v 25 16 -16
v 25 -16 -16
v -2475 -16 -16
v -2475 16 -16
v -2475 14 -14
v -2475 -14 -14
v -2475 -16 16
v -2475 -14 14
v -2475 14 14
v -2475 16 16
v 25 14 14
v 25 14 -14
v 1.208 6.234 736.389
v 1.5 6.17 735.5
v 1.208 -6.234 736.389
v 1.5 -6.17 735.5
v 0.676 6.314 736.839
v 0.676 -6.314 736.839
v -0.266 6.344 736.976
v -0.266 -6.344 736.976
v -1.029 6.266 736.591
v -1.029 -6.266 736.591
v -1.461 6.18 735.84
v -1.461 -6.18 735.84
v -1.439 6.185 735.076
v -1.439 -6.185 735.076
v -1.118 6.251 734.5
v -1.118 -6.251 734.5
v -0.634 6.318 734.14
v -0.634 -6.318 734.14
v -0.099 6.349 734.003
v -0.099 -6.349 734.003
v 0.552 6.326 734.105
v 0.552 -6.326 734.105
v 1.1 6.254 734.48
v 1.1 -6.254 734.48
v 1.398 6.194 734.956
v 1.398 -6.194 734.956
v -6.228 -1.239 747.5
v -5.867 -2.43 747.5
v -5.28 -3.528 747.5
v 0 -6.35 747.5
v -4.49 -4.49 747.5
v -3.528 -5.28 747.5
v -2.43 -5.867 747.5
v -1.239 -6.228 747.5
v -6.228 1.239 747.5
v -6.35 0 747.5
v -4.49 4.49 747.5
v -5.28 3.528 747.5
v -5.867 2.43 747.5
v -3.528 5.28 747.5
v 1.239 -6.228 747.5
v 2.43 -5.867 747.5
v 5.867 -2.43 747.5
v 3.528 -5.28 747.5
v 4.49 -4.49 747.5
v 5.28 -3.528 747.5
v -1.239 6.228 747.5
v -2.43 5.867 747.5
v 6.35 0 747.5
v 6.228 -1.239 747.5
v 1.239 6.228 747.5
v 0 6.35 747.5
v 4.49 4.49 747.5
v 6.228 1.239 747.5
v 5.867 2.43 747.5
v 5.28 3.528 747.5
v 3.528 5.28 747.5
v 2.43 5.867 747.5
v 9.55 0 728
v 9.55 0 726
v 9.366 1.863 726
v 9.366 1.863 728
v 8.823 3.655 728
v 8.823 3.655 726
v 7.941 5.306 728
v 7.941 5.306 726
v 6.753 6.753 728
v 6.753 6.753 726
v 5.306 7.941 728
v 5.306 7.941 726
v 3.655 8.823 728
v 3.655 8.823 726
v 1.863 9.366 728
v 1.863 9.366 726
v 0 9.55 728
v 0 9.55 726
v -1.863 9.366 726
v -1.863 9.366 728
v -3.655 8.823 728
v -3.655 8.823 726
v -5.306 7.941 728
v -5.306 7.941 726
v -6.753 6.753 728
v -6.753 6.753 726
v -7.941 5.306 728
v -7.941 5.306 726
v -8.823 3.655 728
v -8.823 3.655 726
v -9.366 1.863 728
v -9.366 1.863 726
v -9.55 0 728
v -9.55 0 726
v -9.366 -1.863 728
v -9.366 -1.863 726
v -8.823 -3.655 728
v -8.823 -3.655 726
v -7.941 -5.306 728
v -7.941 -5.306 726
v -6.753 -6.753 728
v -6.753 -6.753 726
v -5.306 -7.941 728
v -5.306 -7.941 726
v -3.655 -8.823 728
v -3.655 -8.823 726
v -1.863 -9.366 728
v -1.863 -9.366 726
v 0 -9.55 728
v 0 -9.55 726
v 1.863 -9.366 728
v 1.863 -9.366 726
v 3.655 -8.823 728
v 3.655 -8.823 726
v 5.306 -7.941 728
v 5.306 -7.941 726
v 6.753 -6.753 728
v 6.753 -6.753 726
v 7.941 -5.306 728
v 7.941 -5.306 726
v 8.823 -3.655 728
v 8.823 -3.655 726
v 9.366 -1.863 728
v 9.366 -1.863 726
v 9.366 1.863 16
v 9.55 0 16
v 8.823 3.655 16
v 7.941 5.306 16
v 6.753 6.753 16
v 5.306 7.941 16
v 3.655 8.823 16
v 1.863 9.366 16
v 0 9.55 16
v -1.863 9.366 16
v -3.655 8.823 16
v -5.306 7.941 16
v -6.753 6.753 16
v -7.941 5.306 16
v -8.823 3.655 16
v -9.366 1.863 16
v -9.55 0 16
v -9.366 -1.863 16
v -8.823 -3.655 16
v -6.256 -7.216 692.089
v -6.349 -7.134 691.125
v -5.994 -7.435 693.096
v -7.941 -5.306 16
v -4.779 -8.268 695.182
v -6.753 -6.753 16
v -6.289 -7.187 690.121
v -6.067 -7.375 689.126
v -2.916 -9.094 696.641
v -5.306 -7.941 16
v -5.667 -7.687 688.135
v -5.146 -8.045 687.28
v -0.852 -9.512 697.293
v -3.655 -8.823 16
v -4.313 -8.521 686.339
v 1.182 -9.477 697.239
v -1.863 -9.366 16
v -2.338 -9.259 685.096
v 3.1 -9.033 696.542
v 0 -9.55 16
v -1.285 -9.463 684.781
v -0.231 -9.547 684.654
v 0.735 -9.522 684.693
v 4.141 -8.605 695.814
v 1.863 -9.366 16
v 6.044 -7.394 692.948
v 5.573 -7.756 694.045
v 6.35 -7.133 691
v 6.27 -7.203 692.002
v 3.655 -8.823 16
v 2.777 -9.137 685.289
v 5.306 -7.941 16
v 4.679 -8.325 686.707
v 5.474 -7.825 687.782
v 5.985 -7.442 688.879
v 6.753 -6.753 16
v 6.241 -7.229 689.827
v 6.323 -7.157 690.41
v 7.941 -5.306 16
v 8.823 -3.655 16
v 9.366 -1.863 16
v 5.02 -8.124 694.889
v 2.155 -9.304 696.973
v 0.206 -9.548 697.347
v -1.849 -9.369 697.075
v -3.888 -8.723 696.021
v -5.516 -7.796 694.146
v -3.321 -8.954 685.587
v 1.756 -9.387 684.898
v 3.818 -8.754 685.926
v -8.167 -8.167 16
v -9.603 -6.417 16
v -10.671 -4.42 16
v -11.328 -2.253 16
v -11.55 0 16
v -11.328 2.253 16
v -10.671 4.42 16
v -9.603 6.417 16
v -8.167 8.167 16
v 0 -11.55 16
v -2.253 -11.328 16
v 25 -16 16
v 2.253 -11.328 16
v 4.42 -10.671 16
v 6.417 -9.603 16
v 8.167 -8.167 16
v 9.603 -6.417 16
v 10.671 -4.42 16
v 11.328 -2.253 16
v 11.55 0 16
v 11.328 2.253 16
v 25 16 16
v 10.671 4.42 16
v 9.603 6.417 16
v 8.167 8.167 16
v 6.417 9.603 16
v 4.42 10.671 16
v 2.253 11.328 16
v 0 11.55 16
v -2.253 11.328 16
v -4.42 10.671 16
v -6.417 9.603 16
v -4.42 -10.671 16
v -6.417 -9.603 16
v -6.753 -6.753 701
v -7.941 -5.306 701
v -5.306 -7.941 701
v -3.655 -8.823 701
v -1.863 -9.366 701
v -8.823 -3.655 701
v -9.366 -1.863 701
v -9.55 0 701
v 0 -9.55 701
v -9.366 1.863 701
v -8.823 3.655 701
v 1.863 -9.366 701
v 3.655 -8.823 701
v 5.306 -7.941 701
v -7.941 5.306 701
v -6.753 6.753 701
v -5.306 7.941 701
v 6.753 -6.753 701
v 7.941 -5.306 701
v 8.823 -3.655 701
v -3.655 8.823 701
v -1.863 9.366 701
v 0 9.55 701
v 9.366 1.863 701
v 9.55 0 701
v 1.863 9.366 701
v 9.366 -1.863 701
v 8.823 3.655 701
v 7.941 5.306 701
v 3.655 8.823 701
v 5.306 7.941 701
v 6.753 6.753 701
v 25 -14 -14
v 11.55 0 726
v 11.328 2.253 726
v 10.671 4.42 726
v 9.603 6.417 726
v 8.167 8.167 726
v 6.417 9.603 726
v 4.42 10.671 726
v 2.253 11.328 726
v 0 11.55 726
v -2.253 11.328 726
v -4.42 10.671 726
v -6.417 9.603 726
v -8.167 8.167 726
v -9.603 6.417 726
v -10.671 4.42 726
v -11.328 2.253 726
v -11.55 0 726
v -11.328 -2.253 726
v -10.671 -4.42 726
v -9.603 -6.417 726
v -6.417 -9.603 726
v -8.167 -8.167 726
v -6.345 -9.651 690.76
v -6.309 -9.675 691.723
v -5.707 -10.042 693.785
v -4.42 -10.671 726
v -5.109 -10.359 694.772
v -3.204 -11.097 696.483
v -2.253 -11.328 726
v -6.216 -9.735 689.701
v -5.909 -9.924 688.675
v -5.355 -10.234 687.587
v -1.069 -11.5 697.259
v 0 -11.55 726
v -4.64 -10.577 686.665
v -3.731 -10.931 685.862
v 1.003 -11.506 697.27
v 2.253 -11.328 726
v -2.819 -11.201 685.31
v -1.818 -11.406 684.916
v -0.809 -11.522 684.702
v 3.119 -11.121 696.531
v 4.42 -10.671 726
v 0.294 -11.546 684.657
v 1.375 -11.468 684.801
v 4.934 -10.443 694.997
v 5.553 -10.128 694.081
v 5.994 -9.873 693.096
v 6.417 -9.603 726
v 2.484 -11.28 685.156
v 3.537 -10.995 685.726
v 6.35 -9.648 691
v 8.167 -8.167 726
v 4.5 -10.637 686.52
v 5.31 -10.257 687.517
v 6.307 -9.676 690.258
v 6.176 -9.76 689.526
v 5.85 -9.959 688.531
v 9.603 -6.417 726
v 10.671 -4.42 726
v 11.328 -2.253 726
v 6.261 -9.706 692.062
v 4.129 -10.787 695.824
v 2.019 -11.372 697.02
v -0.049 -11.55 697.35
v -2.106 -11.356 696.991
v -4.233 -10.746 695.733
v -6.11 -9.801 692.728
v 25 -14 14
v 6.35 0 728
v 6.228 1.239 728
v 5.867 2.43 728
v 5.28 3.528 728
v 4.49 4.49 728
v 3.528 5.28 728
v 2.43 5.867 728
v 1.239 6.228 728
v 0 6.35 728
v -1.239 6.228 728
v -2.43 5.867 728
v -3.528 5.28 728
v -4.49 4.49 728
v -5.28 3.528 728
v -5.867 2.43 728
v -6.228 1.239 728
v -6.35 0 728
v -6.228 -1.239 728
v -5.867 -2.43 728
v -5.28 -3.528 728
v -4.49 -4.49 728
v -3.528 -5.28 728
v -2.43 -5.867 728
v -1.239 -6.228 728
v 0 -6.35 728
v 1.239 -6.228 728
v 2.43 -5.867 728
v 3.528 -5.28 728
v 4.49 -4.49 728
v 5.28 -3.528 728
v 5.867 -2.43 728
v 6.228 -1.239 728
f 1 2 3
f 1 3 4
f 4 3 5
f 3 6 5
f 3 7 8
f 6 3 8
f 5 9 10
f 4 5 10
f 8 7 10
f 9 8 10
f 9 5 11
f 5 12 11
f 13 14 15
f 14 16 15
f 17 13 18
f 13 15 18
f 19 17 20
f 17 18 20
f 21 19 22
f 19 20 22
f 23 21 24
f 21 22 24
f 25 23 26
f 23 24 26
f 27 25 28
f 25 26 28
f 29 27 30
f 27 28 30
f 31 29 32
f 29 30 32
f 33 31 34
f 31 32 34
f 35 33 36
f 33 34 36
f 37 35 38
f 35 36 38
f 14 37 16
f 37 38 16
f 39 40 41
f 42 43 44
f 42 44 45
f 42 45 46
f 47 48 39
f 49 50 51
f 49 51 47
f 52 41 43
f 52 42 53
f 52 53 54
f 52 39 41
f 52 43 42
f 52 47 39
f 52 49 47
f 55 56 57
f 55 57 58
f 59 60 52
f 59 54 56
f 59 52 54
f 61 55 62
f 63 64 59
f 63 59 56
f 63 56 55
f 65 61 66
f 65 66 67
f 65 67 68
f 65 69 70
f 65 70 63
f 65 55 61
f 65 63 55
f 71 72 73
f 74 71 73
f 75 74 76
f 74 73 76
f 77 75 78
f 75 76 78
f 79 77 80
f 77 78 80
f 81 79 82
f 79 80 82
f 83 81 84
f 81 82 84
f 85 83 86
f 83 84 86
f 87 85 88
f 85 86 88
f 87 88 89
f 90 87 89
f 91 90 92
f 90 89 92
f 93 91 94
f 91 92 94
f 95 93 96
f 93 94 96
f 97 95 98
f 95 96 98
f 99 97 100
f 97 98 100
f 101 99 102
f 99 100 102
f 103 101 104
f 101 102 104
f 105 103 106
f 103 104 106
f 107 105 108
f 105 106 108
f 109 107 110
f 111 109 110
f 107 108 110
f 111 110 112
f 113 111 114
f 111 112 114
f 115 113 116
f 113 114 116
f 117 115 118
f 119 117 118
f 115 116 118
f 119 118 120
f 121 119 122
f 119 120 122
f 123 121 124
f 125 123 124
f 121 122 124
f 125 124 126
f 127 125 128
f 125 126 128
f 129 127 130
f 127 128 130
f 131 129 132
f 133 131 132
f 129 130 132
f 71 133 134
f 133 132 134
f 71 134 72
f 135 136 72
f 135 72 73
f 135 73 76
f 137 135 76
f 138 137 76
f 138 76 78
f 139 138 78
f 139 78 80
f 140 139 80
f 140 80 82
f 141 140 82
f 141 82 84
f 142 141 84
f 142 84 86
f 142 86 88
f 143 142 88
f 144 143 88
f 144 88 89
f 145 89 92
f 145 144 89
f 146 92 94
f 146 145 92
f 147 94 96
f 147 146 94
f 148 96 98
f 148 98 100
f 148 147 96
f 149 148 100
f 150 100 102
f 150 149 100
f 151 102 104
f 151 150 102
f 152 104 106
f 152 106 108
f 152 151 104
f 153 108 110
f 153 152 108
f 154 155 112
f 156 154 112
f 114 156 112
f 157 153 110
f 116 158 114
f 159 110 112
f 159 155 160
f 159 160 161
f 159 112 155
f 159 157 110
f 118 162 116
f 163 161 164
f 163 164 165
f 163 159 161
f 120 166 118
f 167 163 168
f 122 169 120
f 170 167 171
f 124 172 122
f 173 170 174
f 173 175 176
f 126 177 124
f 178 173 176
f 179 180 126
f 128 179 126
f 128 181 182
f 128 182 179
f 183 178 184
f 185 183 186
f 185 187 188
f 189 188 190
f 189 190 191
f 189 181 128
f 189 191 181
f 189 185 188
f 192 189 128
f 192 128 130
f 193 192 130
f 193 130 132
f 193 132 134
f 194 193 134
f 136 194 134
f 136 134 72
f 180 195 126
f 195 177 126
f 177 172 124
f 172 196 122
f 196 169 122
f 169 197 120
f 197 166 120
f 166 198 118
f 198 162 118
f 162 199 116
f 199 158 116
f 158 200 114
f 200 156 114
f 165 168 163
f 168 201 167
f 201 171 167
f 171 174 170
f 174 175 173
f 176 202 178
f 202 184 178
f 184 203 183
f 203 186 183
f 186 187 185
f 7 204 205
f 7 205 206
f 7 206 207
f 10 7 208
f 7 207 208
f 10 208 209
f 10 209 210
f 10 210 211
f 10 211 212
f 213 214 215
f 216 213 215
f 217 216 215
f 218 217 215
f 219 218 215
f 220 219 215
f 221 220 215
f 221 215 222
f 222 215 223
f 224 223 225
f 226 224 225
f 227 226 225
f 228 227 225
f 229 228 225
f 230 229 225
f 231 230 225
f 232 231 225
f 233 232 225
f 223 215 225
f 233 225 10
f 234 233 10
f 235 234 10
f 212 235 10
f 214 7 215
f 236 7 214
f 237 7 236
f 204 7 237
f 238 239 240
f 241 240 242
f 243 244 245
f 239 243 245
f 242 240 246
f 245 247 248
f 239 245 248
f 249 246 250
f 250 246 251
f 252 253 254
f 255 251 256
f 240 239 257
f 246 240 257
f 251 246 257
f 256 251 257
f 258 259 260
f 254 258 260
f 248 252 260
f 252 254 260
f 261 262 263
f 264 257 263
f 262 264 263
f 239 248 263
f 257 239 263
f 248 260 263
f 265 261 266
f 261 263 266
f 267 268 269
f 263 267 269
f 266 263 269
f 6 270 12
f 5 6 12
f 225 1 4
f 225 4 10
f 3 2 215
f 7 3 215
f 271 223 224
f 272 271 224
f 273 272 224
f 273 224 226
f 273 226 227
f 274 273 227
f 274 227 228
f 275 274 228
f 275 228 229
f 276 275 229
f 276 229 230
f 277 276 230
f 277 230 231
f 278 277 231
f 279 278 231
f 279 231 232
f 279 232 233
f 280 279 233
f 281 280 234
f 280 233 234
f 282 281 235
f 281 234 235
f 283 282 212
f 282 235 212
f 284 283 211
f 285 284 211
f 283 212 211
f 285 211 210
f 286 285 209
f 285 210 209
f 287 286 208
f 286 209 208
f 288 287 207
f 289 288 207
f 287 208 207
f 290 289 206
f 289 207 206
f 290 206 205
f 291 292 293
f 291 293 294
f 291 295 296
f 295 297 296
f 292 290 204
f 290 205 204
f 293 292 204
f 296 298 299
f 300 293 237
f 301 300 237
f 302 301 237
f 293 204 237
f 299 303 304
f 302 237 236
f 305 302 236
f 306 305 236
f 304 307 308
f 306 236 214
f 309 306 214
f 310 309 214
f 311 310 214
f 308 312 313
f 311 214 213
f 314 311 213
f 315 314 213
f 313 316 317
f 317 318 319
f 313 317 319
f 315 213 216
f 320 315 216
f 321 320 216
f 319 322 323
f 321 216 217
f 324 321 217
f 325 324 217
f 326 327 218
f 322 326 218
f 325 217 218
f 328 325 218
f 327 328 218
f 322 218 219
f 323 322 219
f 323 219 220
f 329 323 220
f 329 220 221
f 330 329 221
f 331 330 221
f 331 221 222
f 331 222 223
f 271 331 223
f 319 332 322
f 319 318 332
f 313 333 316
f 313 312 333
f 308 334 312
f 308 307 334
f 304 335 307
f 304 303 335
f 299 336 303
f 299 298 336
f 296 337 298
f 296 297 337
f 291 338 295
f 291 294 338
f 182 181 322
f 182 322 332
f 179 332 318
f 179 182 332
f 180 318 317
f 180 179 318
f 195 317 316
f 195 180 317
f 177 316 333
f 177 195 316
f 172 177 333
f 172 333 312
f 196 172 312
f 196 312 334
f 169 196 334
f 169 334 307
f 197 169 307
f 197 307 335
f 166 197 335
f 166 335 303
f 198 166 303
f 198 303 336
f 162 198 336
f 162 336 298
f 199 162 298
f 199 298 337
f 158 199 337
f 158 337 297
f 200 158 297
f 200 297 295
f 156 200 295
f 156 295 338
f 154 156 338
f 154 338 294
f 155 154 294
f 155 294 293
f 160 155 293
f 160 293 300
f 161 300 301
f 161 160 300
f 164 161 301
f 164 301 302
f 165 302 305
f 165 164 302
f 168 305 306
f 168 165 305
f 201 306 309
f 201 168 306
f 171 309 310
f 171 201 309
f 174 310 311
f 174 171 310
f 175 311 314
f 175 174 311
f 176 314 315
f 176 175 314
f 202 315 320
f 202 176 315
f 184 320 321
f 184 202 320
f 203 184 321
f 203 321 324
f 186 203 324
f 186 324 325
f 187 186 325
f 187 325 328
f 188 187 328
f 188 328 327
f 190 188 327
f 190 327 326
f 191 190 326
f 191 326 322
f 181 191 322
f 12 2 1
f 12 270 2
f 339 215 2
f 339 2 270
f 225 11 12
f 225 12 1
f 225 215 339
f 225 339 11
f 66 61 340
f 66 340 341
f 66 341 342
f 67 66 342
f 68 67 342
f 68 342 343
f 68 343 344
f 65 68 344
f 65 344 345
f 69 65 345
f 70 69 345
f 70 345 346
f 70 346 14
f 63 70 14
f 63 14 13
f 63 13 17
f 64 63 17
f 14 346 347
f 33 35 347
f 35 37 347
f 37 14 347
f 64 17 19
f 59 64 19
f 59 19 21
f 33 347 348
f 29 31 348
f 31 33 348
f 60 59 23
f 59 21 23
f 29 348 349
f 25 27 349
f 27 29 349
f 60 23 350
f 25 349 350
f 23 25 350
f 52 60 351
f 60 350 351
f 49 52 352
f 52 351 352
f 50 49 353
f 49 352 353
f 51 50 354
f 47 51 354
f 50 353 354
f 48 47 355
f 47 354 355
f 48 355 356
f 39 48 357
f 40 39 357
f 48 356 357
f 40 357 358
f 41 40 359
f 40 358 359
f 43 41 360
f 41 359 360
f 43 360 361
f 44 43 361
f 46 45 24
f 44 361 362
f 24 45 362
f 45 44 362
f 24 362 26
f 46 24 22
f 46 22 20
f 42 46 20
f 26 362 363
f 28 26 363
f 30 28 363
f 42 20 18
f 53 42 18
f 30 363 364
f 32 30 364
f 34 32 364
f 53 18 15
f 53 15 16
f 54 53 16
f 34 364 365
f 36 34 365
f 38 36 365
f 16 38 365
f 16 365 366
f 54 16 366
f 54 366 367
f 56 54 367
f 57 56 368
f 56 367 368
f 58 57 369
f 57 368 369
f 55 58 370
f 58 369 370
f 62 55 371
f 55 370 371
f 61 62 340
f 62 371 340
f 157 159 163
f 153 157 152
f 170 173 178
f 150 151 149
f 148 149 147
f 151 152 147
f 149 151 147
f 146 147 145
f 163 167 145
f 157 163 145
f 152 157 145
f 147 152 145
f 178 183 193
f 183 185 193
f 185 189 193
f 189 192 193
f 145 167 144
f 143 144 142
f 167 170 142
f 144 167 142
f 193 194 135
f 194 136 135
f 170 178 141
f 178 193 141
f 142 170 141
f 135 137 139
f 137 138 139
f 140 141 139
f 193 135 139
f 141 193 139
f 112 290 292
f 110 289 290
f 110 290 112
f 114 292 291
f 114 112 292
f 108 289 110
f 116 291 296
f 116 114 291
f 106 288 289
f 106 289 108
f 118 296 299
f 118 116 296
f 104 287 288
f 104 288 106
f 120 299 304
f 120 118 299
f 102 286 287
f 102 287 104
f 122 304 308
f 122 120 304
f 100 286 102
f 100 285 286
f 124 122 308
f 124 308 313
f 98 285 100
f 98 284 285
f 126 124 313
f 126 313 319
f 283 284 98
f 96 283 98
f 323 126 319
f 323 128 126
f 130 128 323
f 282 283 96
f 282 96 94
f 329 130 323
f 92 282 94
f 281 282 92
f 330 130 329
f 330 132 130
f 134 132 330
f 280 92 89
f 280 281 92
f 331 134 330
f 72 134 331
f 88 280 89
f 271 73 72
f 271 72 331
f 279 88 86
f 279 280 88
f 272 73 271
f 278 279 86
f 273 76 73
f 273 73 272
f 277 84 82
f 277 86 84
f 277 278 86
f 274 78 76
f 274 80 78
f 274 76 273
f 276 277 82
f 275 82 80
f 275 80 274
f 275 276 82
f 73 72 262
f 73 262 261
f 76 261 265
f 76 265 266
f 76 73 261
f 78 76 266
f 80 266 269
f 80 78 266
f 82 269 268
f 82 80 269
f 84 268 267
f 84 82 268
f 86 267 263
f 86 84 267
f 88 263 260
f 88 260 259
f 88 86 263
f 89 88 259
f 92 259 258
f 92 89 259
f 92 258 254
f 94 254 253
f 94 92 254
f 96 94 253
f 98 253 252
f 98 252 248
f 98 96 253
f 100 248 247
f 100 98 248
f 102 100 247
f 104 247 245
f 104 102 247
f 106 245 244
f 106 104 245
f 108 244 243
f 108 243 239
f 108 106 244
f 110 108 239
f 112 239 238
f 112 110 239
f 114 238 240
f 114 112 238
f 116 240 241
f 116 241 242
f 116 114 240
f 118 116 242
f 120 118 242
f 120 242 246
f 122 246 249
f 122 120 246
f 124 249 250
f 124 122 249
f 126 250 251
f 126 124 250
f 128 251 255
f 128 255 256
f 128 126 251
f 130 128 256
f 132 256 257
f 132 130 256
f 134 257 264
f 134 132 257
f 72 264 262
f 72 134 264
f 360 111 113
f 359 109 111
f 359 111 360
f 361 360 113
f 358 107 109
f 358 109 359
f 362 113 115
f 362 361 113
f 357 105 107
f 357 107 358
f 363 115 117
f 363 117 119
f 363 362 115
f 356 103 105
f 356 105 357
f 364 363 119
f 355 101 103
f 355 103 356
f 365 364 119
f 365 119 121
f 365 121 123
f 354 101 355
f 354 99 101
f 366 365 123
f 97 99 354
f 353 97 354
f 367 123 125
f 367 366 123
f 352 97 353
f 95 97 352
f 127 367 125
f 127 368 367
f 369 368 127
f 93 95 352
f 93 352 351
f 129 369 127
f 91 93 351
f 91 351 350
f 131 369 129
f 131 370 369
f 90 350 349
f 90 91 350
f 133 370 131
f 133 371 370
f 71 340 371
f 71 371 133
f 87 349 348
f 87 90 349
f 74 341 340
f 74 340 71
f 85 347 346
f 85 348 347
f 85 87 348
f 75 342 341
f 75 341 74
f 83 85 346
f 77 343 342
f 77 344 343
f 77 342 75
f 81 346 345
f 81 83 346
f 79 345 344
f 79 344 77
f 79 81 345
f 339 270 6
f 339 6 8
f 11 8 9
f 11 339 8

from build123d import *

# Parameters (mm, degrees)
F0_W      = 32
F0_H      = 32
F0_W_2    = 28
F0_H_2    = 28
F1_DEPTH  = 25
F2_DEPTH  = 2475
F3_R      = 11.55
F3_R_2    = 9.55
F4_DEPTH  = 710
F5_R      = 9.55
F6_DEPTH  = 25
F7_R      = 6.35
F8_DEPTH  = 21.5
F9_R      = 1.5
F10_DEPTH = 6.5
F11_R     = 9.55
F11_R_2   = 6.35
F12_DEPTH = 2
F13_R     = 6.35
F14_DEPTH = 25


with BuildPart() as f1:
    # F0 (on Right) → F1 (new body)
    with BuildSketch(Plane.YZ):
        Rectangle(F0_W, F0_H)
        Rectangle(F0_W_2, F0_H_2, mode=Mode.SUBTRACT)
    extrude(amount=F1_DEPTH)

    # F0 (on Right) → F2 (join)
    with BuildSketch(Plane.YZ):
        Rectangle(F0_W, F0_H)
        Rectangle(F0_W_2, F0_H_2, mode=Mode.SUBTRACT)
    extrude(amount=-F2_DEPTH)

    # F3 (on face) → F4 (join)
    with BuildSketch(Plane.XY.offset(16)):
        Circle(F3_R)
        Circle(F3_R_2, mode=Mode.SUBTRACT)
    extrude(amount=F4_DEPTH)

    # F13 (on Front) → F14 (cut)
    with BuildSketch(Plane.XZ):
        with Locations((0, 691)):
            Circle(F13_R)
    extrude(amount=F14_DEPTH, mode=Mode.SUBTRACT)


with BuildPart() as f6:
    # F5 (on face) → F6 (new body)
    with BuildSketch(Plane.XY.offset(726)):
        Circle(F5_R)
    extrude(amount=-F6_DEPTH)

    # F7 (on face) → F8 (join)
    with BuildSketch(Plane.XY.offset(726)):
        Circle(F7_R)
    extrude(amount=F8_DEPTH)

    # F9 (on Front) → F10 (cut, symmetric)
    with BuildSketch(Plane.XZ):
        with Locations((0, 735.5)):
            Circle(F9_R)
    extrude(amount=F10_DEPTH, both=True, mode=Mode.SUBTRACT)

    # F11 (on face) → F12 (join)
    with BuildSketch(Plane.XY.offset(726)):
        Circle(F11_R)
        Circle(F11_R_2, mode=Mode.SUBTRACT)
    extrude(amount=F12_DEPTH)


solid = Compound([f1.part, f6.part])
